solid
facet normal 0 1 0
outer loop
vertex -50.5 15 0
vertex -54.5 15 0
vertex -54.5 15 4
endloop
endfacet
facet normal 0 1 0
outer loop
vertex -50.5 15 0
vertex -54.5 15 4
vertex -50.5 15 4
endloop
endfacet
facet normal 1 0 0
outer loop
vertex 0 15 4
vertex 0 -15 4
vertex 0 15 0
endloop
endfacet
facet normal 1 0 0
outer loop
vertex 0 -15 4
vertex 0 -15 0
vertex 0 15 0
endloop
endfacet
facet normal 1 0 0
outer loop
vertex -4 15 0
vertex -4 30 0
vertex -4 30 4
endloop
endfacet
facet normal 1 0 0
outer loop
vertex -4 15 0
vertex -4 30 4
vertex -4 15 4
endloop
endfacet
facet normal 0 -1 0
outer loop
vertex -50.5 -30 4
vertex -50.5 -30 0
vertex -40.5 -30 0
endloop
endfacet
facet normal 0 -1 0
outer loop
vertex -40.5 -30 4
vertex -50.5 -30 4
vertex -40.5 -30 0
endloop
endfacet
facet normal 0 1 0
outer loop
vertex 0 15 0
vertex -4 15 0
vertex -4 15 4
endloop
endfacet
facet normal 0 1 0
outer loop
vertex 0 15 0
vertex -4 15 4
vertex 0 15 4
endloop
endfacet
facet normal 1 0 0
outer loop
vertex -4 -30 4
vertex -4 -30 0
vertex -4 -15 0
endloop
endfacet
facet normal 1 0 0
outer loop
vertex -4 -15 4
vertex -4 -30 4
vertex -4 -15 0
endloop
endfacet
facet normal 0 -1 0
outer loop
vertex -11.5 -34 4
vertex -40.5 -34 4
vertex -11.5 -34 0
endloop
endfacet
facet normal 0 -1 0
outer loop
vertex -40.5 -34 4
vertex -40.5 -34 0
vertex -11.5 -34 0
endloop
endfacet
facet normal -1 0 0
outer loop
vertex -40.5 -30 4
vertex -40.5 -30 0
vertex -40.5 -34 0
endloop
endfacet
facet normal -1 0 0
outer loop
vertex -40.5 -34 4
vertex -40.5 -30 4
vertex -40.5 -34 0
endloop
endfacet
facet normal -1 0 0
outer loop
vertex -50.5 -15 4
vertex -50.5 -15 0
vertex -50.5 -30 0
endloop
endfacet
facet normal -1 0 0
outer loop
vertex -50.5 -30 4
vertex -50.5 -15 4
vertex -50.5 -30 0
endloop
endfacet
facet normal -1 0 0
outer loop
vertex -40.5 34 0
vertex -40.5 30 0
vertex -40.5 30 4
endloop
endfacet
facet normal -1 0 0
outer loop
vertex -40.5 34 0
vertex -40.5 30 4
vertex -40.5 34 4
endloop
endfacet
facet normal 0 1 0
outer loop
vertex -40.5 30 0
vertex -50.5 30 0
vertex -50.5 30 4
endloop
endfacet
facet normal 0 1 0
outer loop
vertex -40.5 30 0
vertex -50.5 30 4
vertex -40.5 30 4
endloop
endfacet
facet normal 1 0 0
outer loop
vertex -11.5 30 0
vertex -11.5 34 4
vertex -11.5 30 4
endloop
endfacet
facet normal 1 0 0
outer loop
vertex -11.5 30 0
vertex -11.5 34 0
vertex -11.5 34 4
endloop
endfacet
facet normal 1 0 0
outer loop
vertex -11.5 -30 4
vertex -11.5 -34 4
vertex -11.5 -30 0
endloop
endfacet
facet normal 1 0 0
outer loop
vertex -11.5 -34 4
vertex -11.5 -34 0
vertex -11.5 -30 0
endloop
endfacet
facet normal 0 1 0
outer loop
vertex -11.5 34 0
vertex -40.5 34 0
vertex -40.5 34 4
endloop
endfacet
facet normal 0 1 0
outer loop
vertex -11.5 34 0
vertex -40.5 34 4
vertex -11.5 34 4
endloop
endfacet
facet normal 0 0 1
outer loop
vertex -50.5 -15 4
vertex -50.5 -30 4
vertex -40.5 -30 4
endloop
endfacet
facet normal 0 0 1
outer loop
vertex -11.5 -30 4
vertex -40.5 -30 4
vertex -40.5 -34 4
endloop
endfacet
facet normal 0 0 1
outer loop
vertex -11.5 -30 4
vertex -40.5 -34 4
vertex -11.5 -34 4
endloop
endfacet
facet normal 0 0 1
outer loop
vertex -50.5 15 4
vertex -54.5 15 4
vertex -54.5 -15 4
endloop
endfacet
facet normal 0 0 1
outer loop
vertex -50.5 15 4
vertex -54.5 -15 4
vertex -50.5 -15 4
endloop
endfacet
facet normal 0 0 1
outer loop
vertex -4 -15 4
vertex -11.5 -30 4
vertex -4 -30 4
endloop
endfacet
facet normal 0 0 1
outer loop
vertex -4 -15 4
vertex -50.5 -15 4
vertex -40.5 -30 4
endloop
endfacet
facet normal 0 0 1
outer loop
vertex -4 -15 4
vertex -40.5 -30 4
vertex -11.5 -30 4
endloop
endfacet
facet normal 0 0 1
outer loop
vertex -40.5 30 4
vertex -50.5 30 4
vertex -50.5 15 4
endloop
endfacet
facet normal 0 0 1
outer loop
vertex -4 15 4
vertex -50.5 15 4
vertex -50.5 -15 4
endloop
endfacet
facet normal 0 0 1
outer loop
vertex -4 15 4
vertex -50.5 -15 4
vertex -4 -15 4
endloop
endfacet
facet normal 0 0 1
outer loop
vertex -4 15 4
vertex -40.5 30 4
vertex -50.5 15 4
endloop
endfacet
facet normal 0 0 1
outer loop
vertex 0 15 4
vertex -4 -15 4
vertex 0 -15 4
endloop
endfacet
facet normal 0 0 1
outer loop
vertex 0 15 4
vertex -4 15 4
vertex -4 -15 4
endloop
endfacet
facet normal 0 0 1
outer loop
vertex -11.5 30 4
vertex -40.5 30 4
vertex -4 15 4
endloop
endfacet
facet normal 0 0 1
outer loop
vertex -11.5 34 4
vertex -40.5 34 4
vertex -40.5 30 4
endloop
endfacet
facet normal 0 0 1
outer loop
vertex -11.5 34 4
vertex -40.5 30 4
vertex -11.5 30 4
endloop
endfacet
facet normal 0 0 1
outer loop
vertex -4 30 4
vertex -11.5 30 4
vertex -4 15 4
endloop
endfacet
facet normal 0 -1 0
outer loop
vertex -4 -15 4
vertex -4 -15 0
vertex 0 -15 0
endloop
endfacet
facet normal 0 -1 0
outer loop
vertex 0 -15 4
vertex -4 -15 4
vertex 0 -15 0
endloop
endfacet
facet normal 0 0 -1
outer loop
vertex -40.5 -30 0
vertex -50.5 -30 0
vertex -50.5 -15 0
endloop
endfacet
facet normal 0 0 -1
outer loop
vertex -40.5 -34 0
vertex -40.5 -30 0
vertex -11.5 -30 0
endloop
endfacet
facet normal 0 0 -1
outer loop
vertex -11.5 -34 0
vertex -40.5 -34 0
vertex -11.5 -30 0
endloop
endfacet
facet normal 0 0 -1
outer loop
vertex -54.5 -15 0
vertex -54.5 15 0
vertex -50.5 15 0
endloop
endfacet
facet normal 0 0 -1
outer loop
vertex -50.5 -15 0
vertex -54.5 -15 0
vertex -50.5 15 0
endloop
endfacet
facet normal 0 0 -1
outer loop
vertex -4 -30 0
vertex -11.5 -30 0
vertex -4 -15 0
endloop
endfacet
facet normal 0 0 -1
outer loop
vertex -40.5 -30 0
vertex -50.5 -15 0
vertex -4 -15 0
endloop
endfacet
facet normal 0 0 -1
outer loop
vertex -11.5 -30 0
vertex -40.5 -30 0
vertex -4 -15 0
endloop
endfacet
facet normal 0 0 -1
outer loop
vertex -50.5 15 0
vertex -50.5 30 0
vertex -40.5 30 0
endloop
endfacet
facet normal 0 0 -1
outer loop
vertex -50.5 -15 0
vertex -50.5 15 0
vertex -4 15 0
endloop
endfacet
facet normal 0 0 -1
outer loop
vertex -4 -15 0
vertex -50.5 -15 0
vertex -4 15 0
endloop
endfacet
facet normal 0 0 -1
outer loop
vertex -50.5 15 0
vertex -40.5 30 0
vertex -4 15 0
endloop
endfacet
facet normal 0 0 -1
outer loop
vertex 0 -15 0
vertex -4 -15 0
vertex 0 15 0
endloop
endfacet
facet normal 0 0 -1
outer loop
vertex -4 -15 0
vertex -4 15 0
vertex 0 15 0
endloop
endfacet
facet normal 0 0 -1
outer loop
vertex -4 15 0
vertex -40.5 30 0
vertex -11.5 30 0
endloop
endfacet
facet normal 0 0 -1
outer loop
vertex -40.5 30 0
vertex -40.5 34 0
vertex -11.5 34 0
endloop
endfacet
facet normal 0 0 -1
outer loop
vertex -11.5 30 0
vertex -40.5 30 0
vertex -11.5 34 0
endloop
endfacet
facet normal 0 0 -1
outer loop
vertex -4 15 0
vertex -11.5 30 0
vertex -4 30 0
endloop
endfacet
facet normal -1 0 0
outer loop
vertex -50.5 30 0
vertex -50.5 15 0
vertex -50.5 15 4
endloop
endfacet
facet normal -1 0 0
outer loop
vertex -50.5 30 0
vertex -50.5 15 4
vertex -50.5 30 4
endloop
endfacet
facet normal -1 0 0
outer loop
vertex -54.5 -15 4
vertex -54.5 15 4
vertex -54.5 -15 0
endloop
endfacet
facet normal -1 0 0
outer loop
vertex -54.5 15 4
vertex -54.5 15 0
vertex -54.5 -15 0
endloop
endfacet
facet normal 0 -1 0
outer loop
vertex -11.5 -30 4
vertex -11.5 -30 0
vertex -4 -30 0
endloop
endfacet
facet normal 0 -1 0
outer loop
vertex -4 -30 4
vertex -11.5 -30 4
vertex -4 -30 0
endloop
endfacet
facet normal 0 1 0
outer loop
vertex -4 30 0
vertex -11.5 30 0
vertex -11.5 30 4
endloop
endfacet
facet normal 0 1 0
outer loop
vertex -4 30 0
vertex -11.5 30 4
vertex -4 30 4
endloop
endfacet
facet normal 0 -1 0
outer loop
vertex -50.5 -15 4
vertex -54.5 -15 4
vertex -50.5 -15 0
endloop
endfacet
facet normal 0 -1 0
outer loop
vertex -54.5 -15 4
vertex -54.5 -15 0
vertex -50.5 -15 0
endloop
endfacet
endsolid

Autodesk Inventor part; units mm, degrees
ref_plane "YZ Plane" through (0, 0, 0) normal (1, 0, 0) x (0, 1, 0)
ref_plane "XZ Plane" through (0, 0, 0) normal (0, 1, 0) x (-1, 0, 0)
ref_plane "XY Plane" through (0, 0, 0) normal (0, 0, 1) x (1, 0, 0)
sketch "Эскиз1" plane through (0, 0, 0) normal (0, 0, 1) x (1, 0, 0)
  line L0 (0, 0) -> (-54.5, 0)
  line L1 (-54.5, 0) -> (-54.5, -15)
  line L2 (-54.5, -15) -> (-50.5, -15)
  line L3 (-50.5, -15) -> (-50.5, -30)
  line L4 (-50.5, -30) -> (-40.5, -30)
  line L5 (-40.5, -30) -> (-40.5, -34)
  line L6 (-40.5, -34) -> (-11.5, -34)
  line L7 (-11.5, -34) -> (-11.5, -30)
  line L8 (-54.5, 0) -> (-54.5, 15)
  line L9 (-54.5, 15) -> (-50.5, 15)
  line L10 (-50.5, 15) -> (-50.5, 30)
  line L11 (-50.5, 30) -> (-40.5, 30)
  line L12 (-40.5, 30) -> (-40.5, 34)
  line L13 (-40.5, 34) -> (-11.5, 34)
  line L14 (-11.5, 34) -> (-11.5, 30)
  line L15 (-11.5, -30) -> (-4, -30)
  line L16 (-4, -30) -> (-4, -15)
  line L17 (-4, -15) -> (0, -15)
  line L18 (0, -15) -> (0, 0)
  line L19 (-11.5, 30) -> (-4, 30)
  line L20 (-4, 30) -> (-4, 15)
  line L21 (-4, 15) -> (0, 15)
  line L22 (0, 15) -> (0, 0)
  dimension "d0" = 29
  dimension "d2" = 10
  dimension "d3" = 30
  dimension "d4" = 15
  dimension "d5" = 4
  dimension "d8" = 11.5
  dimension "d9" = 4
extrude "Выдавливание1" add sketch "Эскиз1" along normal blind 4
properties part number "topRL"
